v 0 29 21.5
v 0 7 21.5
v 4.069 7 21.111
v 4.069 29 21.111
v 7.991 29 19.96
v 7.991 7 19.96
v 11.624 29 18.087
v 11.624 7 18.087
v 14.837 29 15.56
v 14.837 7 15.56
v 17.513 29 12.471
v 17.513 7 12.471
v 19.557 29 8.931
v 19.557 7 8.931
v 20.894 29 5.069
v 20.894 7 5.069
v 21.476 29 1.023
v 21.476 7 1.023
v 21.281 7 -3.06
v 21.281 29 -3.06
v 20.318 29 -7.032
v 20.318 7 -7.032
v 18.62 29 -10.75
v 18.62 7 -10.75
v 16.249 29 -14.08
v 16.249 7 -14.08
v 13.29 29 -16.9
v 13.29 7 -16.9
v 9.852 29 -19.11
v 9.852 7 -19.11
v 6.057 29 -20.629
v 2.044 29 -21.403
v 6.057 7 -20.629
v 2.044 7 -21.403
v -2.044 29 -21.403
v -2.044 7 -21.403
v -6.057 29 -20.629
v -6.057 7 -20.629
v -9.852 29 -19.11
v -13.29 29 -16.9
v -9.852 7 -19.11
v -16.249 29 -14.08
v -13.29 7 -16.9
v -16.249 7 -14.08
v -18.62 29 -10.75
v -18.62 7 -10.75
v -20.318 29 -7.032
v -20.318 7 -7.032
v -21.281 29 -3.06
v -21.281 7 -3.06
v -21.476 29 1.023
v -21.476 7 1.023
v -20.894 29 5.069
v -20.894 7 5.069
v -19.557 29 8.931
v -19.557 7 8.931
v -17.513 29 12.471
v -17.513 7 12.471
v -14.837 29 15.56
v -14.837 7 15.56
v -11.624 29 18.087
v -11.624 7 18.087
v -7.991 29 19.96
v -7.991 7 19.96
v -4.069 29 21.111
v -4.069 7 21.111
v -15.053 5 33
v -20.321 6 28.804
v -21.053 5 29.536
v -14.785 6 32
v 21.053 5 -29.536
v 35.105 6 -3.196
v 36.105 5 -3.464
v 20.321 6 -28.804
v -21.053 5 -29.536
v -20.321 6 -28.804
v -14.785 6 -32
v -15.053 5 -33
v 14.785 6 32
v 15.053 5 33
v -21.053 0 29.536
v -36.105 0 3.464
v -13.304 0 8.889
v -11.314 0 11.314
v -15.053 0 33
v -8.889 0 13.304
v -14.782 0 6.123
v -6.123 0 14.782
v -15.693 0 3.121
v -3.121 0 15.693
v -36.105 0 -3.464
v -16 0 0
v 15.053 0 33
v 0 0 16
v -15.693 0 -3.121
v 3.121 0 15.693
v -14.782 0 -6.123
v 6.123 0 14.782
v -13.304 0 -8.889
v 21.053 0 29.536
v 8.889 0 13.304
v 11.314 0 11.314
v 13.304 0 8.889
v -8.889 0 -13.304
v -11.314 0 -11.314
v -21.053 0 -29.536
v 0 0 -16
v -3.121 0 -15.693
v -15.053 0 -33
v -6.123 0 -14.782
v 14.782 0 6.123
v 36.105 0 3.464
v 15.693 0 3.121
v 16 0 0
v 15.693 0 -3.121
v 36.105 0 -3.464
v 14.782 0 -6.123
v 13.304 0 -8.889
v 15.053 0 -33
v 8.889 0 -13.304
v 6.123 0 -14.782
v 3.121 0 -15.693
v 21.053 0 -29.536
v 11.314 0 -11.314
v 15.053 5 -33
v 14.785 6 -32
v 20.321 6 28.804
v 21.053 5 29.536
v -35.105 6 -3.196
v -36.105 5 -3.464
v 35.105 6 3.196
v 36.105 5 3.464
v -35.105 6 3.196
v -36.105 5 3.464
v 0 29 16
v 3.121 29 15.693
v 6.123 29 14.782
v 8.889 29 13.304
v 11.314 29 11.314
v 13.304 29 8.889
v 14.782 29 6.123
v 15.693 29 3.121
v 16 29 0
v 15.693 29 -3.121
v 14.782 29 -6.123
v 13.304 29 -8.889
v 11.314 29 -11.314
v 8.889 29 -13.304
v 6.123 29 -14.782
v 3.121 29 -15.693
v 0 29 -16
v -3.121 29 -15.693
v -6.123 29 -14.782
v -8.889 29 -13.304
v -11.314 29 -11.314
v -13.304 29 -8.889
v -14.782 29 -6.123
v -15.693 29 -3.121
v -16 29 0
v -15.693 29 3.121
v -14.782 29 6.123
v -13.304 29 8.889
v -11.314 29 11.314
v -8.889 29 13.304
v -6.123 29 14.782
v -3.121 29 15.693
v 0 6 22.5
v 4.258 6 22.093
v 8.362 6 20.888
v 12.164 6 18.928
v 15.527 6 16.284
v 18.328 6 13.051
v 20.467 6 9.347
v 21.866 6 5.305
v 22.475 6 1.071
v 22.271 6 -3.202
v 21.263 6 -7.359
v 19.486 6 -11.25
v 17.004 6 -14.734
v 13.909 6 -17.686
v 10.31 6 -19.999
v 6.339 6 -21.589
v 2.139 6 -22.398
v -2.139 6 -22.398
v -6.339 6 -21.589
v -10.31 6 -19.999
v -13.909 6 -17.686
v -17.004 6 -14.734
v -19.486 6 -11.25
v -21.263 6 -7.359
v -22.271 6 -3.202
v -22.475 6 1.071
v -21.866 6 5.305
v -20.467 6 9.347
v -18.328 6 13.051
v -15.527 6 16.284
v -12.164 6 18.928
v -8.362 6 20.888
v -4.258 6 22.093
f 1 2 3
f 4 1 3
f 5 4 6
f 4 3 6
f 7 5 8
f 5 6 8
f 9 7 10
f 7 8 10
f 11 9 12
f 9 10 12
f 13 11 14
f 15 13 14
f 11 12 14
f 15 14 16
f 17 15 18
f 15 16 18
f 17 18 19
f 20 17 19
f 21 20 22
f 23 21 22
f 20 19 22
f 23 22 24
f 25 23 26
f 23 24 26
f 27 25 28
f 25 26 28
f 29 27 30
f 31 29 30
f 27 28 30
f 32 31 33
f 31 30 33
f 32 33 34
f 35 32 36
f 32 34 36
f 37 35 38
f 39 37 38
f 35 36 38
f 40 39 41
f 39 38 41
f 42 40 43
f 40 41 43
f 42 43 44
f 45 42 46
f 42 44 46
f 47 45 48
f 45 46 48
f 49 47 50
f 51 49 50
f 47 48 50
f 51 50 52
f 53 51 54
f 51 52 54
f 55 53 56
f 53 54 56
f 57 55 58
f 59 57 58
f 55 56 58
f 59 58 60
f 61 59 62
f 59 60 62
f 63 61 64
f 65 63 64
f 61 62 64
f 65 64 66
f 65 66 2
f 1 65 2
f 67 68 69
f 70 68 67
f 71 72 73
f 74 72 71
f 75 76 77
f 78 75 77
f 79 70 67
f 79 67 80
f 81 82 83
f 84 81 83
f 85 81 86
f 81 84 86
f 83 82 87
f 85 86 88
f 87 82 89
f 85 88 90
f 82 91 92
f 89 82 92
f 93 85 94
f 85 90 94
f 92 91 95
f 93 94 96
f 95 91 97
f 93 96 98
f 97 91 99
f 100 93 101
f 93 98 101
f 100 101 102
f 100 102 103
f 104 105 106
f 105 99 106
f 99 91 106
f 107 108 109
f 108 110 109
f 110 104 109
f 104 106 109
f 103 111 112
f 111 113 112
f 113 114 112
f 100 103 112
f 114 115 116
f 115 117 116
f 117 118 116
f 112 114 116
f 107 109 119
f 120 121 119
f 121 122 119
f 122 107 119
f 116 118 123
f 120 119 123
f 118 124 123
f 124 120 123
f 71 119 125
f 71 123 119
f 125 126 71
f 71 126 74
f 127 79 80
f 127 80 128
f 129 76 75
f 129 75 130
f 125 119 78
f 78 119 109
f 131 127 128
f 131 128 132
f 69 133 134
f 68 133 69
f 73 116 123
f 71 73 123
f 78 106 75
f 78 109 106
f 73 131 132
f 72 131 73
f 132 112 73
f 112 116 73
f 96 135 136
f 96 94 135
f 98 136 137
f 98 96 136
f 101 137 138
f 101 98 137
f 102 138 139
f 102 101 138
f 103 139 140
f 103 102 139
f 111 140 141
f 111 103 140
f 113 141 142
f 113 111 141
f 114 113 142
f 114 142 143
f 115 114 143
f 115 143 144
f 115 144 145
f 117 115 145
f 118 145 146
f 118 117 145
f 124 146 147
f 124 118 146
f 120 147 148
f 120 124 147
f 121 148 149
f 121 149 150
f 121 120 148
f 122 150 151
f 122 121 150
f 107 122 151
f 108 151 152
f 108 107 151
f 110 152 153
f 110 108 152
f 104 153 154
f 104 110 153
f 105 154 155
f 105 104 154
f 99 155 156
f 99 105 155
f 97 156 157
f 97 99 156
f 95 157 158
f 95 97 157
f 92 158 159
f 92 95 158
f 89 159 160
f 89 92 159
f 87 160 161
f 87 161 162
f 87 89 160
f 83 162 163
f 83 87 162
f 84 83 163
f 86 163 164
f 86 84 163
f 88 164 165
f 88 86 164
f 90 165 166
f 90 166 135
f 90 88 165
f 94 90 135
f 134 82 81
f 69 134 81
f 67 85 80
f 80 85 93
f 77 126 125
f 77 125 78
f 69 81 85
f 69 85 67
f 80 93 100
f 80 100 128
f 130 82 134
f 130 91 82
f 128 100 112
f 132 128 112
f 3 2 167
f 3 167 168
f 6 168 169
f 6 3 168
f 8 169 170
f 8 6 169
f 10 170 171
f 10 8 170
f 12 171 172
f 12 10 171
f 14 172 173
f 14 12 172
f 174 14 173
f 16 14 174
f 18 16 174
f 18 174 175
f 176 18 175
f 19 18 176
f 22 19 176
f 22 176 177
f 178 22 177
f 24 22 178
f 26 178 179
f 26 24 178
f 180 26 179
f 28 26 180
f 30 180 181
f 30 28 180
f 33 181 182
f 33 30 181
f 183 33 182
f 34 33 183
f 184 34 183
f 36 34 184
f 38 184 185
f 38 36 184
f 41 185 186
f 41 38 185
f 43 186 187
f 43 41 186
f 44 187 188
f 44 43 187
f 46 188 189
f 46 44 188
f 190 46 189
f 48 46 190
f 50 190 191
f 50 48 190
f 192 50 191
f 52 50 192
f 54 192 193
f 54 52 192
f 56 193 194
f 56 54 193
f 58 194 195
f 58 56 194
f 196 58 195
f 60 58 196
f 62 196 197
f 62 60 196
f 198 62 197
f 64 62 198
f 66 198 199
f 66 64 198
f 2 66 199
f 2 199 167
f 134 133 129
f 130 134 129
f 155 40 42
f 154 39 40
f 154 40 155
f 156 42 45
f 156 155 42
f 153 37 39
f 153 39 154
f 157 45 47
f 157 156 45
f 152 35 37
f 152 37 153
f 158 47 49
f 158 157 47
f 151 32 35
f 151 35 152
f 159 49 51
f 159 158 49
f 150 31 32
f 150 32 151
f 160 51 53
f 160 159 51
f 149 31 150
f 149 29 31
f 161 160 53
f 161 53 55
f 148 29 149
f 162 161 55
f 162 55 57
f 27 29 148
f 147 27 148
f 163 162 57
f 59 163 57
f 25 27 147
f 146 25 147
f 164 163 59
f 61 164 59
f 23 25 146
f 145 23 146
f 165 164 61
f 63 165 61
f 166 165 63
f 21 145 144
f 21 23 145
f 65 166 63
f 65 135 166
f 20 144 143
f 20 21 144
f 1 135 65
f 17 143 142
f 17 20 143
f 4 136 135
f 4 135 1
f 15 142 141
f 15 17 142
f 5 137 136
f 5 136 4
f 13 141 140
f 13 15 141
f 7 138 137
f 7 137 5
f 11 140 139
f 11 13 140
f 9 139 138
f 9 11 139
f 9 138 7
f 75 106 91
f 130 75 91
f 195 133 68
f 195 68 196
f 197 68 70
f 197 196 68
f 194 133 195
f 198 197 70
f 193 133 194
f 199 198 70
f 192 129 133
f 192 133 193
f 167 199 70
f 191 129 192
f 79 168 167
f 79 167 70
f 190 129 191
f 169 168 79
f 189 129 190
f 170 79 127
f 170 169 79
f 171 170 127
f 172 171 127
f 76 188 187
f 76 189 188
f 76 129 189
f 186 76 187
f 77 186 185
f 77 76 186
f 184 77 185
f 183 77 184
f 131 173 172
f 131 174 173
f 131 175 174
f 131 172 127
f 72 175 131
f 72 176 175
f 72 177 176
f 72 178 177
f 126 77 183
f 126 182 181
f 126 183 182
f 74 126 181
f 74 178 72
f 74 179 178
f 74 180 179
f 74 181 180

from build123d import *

# Parameters (mm, degrees)
SKETCH1_R           = 16
BOSS_EXTRUDE1_DEPTH = 6
SKETCH2_R           = 21.5
SKETCH2_R_2         = 16
BOSS_EXTRUDE2_DEPTH = 23
CHAMFER1_SIZE       = 4
CHAMFER3_SIZE       = 1


with BuildPart() as part:
    # Sketch1 → Boss-Extrude1 (new body)
    with BuildSketch(Plane(origin=(0, 0, 0), x_dir=(1, 0, 0), z_dir=(0, 1, 0))):
        Polygon((38.105117767, 0), (19.052558883, 33), (-19.052558883, 33), (-38.105117767, 0), (-19.052558883, -33), (19.052558883, -33), align=None)
        with Locations(Location((0, 0, 0), (0, 0, 270))):
            Circle(SKETCH1_R, mode=Mode.SUBTRACT)
    extrude(amount=BOSS_EXTRUDE1_DEPTH)

    # Sketch2 → Boss-Extrude2 (add)
    with BuildSketch(Plane(origin=(0, 6, 0), x_dir=(1, 0, 0), z_dir=(0, 1, 0))):
        with Locations(Location((0, 0, 0), (0, 0, 270))):
            Circle(SKETCH2_R)
        with Locations(Location((0, 0, 0), (0, 0, 270))):
            Circle(SKETCH2_R_2, mode=Mode.SUBTRACT)
    extrude(amount=BOSS_EXTRUDE2_DEPTH)

    # Chamfer1
    chamfer1_edges = [part.edges().sort_by_distance(p)[0] for p in [
        (19.052558883, 3, 33),
        (-19.052558883, 3, 33),
        (-38.105117767, 3, 0),
        (-19.052558883, 3, -33),
        (19.052558883, 3, -33),
        (38.105117767, 3, 0),
    ]]
    chamfer(chamfer1_edges, length=CHAMFER1_SIZE)

    # Chamfer3
    chamfer3_edges = [part.edges().sort_by_distance(p)[0] for p in [
        (0, 6, -21.5),
        (-28.578838325, 6, 16.5),
        (-28.578838325, 6, -16.5),
        (28.578838325, 6, 16.5),
        (28.578838325, 6, -16.5),
        (0, 6, -33),
        (0, 6, 33),
        (-18.052558883, 6, -31.267949192),
        (18.052558883, 6, -31.267949192),
        (36.105117767, 6, 0),
        (18.052558883, 6, 31.267949192),
        (-18.052558883, 6, 31.267949192),
        (-36.105117767, 6, 0),
    ]]
    chamfer(chamfer3_edges, length=CHAMFER3_SIZE)


solid = part.part
